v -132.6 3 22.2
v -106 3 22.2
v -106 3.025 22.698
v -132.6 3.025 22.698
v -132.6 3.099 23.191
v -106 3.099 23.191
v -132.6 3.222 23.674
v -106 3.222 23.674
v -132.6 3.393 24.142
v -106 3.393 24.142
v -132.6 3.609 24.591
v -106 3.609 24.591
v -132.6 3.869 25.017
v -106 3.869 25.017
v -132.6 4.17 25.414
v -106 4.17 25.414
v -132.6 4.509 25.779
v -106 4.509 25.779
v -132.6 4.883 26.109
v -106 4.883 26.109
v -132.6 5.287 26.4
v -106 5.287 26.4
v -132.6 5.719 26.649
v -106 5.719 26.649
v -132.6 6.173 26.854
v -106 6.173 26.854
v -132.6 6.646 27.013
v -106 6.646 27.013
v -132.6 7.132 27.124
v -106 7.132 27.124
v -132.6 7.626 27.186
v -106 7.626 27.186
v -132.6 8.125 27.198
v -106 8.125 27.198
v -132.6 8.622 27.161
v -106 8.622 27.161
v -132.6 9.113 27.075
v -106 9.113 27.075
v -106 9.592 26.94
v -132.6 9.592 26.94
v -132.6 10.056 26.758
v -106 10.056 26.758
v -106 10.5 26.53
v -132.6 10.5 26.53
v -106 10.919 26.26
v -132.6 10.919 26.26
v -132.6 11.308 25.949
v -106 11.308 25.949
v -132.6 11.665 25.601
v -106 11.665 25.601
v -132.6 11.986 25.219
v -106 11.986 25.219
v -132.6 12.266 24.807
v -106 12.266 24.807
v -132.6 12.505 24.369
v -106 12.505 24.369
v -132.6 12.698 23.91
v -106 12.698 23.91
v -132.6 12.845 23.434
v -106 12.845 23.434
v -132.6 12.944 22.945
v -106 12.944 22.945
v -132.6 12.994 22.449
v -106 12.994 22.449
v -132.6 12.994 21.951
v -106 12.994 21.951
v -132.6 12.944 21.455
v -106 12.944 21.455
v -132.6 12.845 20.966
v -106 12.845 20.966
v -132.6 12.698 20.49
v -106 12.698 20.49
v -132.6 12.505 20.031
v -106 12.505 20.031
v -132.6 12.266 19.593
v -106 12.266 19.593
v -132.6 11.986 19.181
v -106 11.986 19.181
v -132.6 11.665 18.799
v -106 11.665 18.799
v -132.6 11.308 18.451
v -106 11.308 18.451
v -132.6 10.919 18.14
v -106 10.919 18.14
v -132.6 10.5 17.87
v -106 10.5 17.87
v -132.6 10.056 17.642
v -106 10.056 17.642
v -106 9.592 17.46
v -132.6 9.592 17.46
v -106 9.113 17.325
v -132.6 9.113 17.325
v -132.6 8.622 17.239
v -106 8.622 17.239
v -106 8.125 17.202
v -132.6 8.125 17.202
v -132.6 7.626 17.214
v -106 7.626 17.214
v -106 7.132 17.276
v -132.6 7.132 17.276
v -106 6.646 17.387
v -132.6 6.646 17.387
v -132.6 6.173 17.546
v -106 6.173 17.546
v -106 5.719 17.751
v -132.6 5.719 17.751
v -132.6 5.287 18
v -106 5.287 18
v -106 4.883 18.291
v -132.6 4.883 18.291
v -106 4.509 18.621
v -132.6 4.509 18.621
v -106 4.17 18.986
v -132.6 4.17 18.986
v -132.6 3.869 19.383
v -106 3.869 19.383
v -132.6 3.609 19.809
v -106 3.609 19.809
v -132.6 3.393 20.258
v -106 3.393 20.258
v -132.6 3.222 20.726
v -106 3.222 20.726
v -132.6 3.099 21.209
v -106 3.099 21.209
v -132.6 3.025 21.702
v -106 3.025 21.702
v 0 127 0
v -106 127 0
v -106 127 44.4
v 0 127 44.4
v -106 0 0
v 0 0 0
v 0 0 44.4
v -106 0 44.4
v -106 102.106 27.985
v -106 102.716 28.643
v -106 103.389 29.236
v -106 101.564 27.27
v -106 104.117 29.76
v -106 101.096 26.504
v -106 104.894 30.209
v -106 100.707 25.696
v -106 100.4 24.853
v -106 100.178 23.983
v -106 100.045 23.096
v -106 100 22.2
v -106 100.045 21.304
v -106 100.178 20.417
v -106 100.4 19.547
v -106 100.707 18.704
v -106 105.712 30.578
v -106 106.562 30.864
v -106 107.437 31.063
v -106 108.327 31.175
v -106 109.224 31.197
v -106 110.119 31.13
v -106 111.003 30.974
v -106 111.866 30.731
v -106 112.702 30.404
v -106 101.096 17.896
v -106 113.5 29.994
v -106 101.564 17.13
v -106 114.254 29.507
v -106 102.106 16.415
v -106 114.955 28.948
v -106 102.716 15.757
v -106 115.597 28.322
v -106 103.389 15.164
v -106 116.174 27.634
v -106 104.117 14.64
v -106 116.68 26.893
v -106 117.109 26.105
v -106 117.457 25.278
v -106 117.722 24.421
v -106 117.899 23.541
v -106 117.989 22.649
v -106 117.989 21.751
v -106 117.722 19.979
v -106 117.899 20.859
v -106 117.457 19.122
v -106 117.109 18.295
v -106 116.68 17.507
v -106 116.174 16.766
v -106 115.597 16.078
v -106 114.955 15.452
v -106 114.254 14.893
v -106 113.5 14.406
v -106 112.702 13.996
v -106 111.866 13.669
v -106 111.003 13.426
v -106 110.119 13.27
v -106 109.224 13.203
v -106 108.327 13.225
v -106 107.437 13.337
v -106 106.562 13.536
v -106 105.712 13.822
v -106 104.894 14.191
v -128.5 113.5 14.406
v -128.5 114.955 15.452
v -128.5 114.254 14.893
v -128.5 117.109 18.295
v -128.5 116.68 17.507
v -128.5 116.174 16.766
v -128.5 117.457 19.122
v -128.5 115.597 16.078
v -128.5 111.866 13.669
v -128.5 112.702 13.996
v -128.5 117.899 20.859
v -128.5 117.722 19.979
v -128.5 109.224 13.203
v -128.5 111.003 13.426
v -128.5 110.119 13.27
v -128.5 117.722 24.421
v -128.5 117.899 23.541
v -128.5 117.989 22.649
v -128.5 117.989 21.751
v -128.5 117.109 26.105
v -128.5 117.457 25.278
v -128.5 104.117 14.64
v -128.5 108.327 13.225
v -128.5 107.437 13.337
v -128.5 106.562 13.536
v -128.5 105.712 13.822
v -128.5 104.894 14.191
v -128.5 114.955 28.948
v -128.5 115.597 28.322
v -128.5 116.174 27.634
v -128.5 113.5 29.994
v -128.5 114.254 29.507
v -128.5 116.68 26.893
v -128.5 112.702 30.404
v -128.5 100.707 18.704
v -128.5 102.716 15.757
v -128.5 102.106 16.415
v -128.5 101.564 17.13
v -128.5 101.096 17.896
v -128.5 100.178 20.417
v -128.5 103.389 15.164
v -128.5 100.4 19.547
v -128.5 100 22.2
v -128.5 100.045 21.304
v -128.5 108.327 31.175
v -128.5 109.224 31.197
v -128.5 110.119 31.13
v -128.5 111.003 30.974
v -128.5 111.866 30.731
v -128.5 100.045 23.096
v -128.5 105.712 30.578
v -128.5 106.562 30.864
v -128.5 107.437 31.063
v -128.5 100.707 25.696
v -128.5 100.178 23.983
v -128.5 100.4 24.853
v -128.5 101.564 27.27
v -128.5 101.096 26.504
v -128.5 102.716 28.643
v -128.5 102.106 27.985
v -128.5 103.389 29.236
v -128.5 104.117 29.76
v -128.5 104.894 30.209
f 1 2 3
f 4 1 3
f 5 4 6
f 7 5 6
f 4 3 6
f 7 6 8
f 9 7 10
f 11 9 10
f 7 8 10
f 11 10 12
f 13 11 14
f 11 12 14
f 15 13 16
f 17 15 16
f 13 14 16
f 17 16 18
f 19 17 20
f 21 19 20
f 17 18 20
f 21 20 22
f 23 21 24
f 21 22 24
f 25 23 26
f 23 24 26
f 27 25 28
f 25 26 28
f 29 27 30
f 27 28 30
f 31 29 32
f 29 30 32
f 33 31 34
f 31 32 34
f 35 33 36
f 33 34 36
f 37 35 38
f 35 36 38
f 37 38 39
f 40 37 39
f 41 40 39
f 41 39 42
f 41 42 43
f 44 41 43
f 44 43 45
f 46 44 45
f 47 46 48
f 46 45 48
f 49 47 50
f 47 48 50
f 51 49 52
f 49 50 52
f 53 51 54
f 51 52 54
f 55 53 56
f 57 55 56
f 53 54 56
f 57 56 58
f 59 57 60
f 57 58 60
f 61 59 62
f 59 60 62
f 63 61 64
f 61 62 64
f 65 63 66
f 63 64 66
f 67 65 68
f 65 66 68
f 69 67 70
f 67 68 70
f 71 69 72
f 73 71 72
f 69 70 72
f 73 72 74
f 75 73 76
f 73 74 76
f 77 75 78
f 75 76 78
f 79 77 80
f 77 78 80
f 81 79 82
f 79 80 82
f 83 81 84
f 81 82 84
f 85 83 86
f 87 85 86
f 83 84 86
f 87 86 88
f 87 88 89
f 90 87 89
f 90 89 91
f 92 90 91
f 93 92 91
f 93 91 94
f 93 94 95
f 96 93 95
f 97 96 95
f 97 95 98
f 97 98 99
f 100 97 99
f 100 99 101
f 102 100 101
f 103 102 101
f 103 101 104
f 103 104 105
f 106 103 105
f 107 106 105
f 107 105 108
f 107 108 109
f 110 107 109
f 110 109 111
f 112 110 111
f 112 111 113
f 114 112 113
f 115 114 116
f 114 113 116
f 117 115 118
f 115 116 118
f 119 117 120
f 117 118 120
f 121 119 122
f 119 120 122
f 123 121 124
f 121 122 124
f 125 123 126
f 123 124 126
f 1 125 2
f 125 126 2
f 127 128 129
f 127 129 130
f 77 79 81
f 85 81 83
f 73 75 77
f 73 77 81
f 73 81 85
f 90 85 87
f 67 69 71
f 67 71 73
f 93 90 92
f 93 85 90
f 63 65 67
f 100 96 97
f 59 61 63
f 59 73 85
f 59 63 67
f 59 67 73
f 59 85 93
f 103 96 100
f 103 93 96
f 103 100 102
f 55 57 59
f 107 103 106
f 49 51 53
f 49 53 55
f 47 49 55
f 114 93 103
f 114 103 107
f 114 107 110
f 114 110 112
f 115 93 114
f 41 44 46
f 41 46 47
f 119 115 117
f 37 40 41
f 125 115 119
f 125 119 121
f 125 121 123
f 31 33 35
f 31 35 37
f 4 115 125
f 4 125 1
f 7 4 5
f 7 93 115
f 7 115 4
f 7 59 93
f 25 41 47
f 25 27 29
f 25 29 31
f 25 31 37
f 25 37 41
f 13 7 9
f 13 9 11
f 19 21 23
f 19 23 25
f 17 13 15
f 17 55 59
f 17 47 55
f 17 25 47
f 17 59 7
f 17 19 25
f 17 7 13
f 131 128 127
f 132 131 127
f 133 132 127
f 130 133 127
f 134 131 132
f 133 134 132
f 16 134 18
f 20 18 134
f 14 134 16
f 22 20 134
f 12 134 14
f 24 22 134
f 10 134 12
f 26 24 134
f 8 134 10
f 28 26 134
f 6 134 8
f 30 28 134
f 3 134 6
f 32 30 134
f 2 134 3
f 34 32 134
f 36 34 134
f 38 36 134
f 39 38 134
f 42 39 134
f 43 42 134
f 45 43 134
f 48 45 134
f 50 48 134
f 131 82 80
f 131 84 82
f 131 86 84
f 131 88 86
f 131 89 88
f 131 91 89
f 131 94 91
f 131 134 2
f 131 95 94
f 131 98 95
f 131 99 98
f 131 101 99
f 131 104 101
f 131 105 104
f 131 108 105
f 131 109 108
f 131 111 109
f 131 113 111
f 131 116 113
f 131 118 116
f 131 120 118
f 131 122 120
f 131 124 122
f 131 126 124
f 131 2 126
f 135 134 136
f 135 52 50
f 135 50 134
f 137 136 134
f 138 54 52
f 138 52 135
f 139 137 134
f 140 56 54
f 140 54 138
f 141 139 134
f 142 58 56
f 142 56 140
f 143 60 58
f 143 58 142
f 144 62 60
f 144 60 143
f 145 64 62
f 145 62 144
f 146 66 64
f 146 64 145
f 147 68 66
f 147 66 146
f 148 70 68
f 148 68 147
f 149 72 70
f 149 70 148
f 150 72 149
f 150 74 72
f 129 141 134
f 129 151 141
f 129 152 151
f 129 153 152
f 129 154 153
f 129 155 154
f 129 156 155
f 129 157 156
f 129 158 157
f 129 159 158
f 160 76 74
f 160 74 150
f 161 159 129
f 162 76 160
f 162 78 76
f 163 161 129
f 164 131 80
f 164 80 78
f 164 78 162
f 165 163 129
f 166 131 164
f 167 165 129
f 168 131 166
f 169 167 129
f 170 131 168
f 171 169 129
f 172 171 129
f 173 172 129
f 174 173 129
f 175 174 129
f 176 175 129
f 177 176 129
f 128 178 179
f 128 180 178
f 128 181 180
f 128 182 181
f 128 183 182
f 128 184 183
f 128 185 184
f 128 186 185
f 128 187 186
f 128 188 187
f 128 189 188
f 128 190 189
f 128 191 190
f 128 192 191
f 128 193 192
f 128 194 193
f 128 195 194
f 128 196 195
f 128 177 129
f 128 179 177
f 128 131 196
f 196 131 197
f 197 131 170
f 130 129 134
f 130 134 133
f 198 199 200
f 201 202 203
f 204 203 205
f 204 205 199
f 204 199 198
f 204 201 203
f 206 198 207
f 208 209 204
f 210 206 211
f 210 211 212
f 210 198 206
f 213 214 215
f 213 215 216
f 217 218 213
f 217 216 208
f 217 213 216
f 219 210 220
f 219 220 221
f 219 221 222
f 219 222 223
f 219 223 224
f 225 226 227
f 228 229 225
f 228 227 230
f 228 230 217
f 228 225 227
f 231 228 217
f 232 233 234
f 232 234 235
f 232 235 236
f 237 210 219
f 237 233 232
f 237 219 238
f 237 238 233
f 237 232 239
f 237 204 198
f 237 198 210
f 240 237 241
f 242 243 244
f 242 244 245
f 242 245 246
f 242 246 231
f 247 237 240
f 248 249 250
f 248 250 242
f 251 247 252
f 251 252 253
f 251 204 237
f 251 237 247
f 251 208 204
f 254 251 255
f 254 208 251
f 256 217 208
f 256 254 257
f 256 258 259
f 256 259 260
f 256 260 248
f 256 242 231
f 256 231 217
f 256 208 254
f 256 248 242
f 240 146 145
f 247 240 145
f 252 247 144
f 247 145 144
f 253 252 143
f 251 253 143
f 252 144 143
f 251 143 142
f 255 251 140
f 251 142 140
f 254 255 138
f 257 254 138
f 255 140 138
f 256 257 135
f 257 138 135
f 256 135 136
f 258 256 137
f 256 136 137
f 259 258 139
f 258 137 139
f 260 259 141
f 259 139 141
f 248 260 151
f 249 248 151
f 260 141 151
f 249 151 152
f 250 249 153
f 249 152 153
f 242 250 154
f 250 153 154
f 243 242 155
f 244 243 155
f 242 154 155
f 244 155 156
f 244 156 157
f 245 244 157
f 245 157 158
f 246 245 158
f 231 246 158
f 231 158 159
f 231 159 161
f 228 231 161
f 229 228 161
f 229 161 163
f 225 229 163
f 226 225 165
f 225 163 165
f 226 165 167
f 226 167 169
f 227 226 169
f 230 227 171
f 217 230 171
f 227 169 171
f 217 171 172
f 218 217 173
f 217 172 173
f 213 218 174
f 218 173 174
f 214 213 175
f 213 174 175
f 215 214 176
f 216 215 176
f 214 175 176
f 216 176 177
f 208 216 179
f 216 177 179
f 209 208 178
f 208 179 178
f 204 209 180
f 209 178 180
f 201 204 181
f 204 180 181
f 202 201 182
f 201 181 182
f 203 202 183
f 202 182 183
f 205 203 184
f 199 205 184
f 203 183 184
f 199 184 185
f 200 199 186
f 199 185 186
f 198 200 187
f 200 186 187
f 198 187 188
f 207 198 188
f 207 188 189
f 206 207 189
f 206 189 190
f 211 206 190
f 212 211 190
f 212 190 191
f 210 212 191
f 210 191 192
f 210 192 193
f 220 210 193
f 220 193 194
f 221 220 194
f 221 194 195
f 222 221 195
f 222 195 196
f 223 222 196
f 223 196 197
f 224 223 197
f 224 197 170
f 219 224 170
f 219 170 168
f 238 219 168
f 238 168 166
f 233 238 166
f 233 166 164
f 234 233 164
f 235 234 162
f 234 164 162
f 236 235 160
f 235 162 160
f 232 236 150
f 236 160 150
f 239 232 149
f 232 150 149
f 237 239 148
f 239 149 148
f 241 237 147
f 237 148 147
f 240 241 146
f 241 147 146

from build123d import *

# Parameters (mm, degrees)
F0_W     = 106
F0_H     = 127
F1_DEPTH = 44.4
F2_R     = 9
F3_DEPTH = 22.5
F2_R_2   = 5
F4_DEPTH = 26.6


with BuildPart() as f1:
    # F0 (on Top) → F1 (new body)
    with BuildSketch(Plane.XY):
        with Locations((-53, 63.5)):
            Rectangle(F0_W, F0_H)
    extrude(amount=F1_DEPTH)

    # F2 (on face) → F3 (join)
    with BuildSketch(Plane(origin=(-106, 0, 0), x_dir=(0, -1, 0), z_dir=(-1, 0, 0))):
        with Locations((-109, 22.2)):
            Circle(F2_R)
    extrude(amount=F3_DEPTH)

    # F2 (on face) → F4 (join)
    with BuildSketch(Plane(origin=(-106, 0, 0), x_dir=(0, -1, 0), z_dir=(-1, 0, 0))):
        with Locations((-8, 22.2)):
            Circle(F2_R_2)
    extrude(amount=F4_DEPTH)


solid = f1.part
